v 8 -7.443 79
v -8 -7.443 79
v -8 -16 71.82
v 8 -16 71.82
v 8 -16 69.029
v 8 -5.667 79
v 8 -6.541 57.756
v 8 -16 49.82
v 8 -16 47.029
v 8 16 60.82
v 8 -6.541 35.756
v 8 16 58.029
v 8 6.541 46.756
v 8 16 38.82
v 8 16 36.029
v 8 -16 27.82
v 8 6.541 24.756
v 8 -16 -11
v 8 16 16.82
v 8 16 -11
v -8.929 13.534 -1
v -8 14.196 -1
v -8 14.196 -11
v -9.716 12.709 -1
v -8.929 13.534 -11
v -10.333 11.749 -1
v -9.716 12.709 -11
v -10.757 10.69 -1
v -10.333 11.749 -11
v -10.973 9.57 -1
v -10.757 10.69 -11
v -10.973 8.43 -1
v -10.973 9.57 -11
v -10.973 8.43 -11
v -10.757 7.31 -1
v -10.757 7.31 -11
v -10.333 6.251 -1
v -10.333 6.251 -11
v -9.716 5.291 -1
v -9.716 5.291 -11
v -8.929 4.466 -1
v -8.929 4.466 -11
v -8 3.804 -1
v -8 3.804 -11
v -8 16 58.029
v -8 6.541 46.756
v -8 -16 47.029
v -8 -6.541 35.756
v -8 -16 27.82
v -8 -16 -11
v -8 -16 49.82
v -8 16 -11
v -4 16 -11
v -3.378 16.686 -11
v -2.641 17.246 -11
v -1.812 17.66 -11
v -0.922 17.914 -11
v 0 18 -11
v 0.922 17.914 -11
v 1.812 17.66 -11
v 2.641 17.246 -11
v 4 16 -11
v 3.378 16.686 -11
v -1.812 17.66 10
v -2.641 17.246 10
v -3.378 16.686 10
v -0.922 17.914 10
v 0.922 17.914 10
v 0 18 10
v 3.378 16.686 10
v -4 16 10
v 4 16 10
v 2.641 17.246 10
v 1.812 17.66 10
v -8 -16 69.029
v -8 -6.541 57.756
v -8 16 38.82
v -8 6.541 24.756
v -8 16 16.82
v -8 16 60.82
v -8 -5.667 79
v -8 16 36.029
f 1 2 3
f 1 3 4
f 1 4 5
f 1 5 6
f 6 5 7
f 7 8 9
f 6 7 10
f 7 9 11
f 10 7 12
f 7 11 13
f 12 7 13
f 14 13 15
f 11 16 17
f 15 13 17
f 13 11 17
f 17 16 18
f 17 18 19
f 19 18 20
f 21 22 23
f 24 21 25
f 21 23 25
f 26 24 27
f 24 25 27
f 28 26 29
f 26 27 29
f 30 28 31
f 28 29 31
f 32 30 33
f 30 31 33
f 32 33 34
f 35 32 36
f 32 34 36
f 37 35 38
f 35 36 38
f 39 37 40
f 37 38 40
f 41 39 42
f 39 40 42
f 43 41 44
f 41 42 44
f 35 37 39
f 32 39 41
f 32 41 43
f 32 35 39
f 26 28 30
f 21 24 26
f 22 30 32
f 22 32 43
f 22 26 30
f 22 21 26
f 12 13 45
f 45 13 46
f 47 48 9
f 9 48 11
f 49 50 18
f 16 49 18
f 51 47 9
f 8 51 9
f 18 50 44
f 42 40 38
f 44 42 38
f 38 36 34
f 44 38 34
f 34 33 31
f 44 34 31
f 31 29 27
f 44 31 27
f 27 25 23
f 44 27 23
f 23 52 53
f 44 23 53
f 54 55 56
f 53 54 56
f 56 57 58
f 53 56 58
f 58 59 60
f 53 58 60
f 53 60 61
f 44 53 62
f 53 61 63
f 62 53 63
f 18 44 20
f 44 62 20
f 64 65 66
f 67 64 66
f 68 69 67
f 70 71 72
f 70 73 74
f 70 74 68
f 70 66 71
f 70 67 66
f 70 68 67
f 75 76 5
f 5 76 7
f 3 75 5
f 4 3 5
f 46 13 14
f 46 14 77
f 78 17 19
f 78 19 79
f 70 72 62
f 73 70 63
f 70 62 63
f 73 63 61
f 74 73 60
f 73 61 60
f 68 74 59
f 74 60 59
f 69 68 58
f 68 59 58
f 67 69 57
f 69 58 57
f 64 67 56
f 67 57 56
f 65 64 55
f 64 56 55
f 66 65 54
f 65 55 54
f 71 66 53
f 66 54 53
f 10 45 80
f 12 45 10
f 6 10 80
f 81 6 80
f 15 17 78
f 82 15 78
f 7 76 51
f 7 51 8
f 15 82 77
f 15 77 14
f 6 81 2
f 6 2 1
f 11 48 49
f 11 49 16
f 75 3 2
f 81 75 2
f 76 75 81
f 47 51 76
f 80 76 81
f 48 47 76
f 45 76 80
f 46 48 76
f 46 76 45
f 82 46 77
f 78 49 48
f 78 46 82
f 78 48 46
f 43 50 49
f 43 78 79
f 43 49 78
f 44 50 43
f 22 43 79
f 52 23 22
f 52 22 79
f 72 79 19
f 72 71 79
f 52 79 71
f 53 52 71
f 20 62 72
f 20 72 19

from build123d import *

# Parameters (mm, degrees)
CYLINDER128_R                   = 6
CYLINDER128_DEPTH               = 10
BOX001027045018_W               = 21
BOX001027045018_H               = 13
BOX001027045018_DEPTH           = 30
BOX001027045018_ROLL_ANGLE      = 40
BOX001027045019_W               = 21
BOX001027045019_H               = 13
BOX001027045019_DEPTH           = 30
BOX001027045019_ROLL_ANGLE      = 39.99997
BOX001027045019_PLACEMENT_ANGLE = 180
BOX001027045021_W               = 21
BOX001027045021_H               = 13
BOX001027045021_DEPTH           = 30
BOX001027045021_ROLL_ANGLE      = 40
BOX001027045021_PLACEMENT_ANGLE = 180
BOX001027045022_W               = 21
BOX001027045022_H               = 13
BOX001027045022_DEPTH           = 30
BOX001027045022_ROLL_ANGLE      = 40
BOX001027045024_W               = 21
BOX001027045024_H               = 13
BOX001027045024_DEPTH           = 30
BOX001027045024_ROLL_ANGLE      = 40
BOX001027045020_W               = 21
BOX001027045020_H               = 39
BOX001027045020_DEPTH           = 30
BOX001027045020_ROLL_ANGLE      = 39.99997
BOX001027045020_PLACEMENT_ANGLE = 180
BOX001027045017_W               = 16
BOX001027045017_H               = 32
BOX001027045017_DEPTH           = 90
CYLINDER129_R                   = 5
CYLINDER129_DEPTH               = 21


with BuildPart() as cylinder186:
    # Cylinder128 → Cylinder128 (new body)
    with BuildSketch(Plane(origin=(-5, 9, -11), x_dir=(1, 0, 0), z_dir=(0, 0, 1))):
        Circle(CYLINDER128_R)
    extrude(amount=CYLINDER128_DEPTH)


with BuildPart() as cube071:
    # Box001027045018 → Box001027045018 (new body)
    with BuildSketch(Plane.XY):
        with Locations((10.5, 6.5)):
            Rectangle(BOX001027045018_W, BOX001027045018_H)
    extrude(amount=BOX001027045018_DEPTH)


with BuildPart() as cube071_1:
    # Box001027045018 roll: moved
    add(cube071.part.rotate(Axis((0, 0, 0), (1, 0, 0)), BOX001027045018_ROLL_ANGLE))


with BuildPart() as cube071_2:
    # Box001027045018 placement: moved
    add(cube071_1.part.moved(Location((-11, -16.5, 27.4))))


with BuildPart() as cube072:
    # Box001027045019 → Box001027045019 (new body)
    with BuildSketch(Plane.XY):
        with Locations((10.5, 6.5)):
            Rectangle(BOX001027045019_W, BOX001027045019_H)
    extrude(amount=BOX001027045019_DEPTH)


with BuildPart() as cube072_1:
    # Box001027045019 roll: moved
    add(cube072.part.rotate(Axis((0, 0, 0), (1, 0, 0)), BOX001027045019_ROLL_ANGLE))


with BuildPart() as cube072_2:
    # Box001027045019 placement: moved
    add(cube072_1.part.moved(Location((11, 16.5, 38.4))).rotate(Axis((11, 16.5, 38.4), (0, 0, 1)), BOX001027045019_PLACEMENT_ANGLE))


with BuildPart() as cube074:
    # Box001027045021 → Box001027045021 (new body)
    with BuildSketch(Plane.XY):
        with Locations((10.5, 6.5)):
            Rectangle(BOX001027045021_W, BOX001027045021_H)
    extrude(amount=BOX001027045021_DEPTH)


with BuildPart() as cube074_1:
    # Box001027045021 roll: moved
    add(cube074.part.rotate(Axis((0, 0, 0), (1, 0, 0)), BOX001027045021_ROLL_ANGLE))


with BuildPart() as cube074_2:
    # Box001027045021 placement: moved
    add(cube074_1.part.moved(Location((11, 16.5, 16.4))).rotate(Axis((11, 16.5, 16.4), (0, 0, 1)), BOX001027045021_PLACEMENT_ANGLE))


with BuildPart() as cube075:
    # Box001027045022 → Box001027045022 (new body)
    with BuildSketch(Plane.XY):
        with Locations((10.5, 6.5)):
            Rectangle(BOX001027045022_W, BOX001027045022_H)
    extrude(amount=BOX001027045022_DEPTH)


with BuildPart() as cube075_1:
    # Box001027045022 roll: moved
    add(cube075.part.rotate(Axis((0, 0, 0), (1, 0, 0)), BOX001027045022_ROLL_ANGLE))


with BuildPart() as cube075_2:
    # Box001027045022 placement: moved
    add(cube075_1.part.moved(Location((-11, -16.5, 49.4))))


with BuildPart() as cube077:
    # Box001027045024 → Box001027045024 (new body)
    with BuildSketch(Plane.XY):
        with Locations((10.5, 6.5)):
            Rectangle(BOX001027045024_W, BOX001027045024_H)
    extrude(amount=BOX001027045024_DEPTH)


with BuildPart() as cube077_1:
    # Box001027045024 roll: moved
    add(cube077.part.rotate(Axis((0, 0, 0), (1, 0, 0)), BOX001027045024_ROLL_ANGLE))


with BuildPart() as cube077_2:
    # Box001027045024 placement: moved
    add(cube077_1.part.moved(Location((-11, -16.5, 71.4))))


with BuildPart() as fusion112034:
    # Box001027045020 → Box001027045020 (new body)
    with BuildSketch(Plane.XY):
        with Locations((10.5, 19.5)):
            Rectangle(BOX001027045020_W, BOX001027045020_H)
    extrude(amount=BOX001027045020_DEPTH)


with BuildPart() as fusion112034_1:
    # Box001027045020 roll: moved
    add(fusion112034.part.rotate(Axis((0, 0, 0), (1, 0, 0)), BOX001027045020_ROLL_ANGLE))


with BuildPart() as fusion112034_2:
    # Box001027045020 placement: moved
    add(fusion112034_1.part.moved(Location((11, 16.5, 60.4))).rotate(Axis((11, 16.5, 60.4), (0, 0, 1)), BOX001027045020_PLACEMENT_ANGLE))

    # Fusion112034: union Cube071, Cube072, Cube074, Cube075, Cube077
    add(cube071_2.part)
    add(cube072_2.part)
    add(cube074_2.part)
    add(cube075_2.part)
    add(cube077_2.part)


with BuildPart() as fusion112035:
    # Box001027045017 → Box001027045017 (new body)
    with BuildSketch(Plane(origin=(-8, -16, -11), x_dir=(1, 0, 0), z_dir=(0, 0, 1))):
        with Locations((8, 16)):
            Rectangle(BOX001027045017_W, BOX001027045017_H)
    extrude(amount=BOX001027045017_DEPTH)

    # Cut070: cut Fusion112034
    add(fusion112034_2.part, mode=Mode.SUBTRACT)

    # Fusion112035: union Cylinder186
    add(cylinder186.part)


with BuildPart() as body_blank:
    # Cylinder129 → Cylinder129 (new body)
    with BuildSketch(Plane(origin=(0, 13, -11), x_dir=(1, 0, 0), z_dir=(0, 0, 1))):
        Circle(CYLINDER129_R)
    extrude(amount=CYLINDER129_DEPTH)

    # Fusion112036: union Fusion112035
    add(fusion112035.part)


solid = body_blank.part
